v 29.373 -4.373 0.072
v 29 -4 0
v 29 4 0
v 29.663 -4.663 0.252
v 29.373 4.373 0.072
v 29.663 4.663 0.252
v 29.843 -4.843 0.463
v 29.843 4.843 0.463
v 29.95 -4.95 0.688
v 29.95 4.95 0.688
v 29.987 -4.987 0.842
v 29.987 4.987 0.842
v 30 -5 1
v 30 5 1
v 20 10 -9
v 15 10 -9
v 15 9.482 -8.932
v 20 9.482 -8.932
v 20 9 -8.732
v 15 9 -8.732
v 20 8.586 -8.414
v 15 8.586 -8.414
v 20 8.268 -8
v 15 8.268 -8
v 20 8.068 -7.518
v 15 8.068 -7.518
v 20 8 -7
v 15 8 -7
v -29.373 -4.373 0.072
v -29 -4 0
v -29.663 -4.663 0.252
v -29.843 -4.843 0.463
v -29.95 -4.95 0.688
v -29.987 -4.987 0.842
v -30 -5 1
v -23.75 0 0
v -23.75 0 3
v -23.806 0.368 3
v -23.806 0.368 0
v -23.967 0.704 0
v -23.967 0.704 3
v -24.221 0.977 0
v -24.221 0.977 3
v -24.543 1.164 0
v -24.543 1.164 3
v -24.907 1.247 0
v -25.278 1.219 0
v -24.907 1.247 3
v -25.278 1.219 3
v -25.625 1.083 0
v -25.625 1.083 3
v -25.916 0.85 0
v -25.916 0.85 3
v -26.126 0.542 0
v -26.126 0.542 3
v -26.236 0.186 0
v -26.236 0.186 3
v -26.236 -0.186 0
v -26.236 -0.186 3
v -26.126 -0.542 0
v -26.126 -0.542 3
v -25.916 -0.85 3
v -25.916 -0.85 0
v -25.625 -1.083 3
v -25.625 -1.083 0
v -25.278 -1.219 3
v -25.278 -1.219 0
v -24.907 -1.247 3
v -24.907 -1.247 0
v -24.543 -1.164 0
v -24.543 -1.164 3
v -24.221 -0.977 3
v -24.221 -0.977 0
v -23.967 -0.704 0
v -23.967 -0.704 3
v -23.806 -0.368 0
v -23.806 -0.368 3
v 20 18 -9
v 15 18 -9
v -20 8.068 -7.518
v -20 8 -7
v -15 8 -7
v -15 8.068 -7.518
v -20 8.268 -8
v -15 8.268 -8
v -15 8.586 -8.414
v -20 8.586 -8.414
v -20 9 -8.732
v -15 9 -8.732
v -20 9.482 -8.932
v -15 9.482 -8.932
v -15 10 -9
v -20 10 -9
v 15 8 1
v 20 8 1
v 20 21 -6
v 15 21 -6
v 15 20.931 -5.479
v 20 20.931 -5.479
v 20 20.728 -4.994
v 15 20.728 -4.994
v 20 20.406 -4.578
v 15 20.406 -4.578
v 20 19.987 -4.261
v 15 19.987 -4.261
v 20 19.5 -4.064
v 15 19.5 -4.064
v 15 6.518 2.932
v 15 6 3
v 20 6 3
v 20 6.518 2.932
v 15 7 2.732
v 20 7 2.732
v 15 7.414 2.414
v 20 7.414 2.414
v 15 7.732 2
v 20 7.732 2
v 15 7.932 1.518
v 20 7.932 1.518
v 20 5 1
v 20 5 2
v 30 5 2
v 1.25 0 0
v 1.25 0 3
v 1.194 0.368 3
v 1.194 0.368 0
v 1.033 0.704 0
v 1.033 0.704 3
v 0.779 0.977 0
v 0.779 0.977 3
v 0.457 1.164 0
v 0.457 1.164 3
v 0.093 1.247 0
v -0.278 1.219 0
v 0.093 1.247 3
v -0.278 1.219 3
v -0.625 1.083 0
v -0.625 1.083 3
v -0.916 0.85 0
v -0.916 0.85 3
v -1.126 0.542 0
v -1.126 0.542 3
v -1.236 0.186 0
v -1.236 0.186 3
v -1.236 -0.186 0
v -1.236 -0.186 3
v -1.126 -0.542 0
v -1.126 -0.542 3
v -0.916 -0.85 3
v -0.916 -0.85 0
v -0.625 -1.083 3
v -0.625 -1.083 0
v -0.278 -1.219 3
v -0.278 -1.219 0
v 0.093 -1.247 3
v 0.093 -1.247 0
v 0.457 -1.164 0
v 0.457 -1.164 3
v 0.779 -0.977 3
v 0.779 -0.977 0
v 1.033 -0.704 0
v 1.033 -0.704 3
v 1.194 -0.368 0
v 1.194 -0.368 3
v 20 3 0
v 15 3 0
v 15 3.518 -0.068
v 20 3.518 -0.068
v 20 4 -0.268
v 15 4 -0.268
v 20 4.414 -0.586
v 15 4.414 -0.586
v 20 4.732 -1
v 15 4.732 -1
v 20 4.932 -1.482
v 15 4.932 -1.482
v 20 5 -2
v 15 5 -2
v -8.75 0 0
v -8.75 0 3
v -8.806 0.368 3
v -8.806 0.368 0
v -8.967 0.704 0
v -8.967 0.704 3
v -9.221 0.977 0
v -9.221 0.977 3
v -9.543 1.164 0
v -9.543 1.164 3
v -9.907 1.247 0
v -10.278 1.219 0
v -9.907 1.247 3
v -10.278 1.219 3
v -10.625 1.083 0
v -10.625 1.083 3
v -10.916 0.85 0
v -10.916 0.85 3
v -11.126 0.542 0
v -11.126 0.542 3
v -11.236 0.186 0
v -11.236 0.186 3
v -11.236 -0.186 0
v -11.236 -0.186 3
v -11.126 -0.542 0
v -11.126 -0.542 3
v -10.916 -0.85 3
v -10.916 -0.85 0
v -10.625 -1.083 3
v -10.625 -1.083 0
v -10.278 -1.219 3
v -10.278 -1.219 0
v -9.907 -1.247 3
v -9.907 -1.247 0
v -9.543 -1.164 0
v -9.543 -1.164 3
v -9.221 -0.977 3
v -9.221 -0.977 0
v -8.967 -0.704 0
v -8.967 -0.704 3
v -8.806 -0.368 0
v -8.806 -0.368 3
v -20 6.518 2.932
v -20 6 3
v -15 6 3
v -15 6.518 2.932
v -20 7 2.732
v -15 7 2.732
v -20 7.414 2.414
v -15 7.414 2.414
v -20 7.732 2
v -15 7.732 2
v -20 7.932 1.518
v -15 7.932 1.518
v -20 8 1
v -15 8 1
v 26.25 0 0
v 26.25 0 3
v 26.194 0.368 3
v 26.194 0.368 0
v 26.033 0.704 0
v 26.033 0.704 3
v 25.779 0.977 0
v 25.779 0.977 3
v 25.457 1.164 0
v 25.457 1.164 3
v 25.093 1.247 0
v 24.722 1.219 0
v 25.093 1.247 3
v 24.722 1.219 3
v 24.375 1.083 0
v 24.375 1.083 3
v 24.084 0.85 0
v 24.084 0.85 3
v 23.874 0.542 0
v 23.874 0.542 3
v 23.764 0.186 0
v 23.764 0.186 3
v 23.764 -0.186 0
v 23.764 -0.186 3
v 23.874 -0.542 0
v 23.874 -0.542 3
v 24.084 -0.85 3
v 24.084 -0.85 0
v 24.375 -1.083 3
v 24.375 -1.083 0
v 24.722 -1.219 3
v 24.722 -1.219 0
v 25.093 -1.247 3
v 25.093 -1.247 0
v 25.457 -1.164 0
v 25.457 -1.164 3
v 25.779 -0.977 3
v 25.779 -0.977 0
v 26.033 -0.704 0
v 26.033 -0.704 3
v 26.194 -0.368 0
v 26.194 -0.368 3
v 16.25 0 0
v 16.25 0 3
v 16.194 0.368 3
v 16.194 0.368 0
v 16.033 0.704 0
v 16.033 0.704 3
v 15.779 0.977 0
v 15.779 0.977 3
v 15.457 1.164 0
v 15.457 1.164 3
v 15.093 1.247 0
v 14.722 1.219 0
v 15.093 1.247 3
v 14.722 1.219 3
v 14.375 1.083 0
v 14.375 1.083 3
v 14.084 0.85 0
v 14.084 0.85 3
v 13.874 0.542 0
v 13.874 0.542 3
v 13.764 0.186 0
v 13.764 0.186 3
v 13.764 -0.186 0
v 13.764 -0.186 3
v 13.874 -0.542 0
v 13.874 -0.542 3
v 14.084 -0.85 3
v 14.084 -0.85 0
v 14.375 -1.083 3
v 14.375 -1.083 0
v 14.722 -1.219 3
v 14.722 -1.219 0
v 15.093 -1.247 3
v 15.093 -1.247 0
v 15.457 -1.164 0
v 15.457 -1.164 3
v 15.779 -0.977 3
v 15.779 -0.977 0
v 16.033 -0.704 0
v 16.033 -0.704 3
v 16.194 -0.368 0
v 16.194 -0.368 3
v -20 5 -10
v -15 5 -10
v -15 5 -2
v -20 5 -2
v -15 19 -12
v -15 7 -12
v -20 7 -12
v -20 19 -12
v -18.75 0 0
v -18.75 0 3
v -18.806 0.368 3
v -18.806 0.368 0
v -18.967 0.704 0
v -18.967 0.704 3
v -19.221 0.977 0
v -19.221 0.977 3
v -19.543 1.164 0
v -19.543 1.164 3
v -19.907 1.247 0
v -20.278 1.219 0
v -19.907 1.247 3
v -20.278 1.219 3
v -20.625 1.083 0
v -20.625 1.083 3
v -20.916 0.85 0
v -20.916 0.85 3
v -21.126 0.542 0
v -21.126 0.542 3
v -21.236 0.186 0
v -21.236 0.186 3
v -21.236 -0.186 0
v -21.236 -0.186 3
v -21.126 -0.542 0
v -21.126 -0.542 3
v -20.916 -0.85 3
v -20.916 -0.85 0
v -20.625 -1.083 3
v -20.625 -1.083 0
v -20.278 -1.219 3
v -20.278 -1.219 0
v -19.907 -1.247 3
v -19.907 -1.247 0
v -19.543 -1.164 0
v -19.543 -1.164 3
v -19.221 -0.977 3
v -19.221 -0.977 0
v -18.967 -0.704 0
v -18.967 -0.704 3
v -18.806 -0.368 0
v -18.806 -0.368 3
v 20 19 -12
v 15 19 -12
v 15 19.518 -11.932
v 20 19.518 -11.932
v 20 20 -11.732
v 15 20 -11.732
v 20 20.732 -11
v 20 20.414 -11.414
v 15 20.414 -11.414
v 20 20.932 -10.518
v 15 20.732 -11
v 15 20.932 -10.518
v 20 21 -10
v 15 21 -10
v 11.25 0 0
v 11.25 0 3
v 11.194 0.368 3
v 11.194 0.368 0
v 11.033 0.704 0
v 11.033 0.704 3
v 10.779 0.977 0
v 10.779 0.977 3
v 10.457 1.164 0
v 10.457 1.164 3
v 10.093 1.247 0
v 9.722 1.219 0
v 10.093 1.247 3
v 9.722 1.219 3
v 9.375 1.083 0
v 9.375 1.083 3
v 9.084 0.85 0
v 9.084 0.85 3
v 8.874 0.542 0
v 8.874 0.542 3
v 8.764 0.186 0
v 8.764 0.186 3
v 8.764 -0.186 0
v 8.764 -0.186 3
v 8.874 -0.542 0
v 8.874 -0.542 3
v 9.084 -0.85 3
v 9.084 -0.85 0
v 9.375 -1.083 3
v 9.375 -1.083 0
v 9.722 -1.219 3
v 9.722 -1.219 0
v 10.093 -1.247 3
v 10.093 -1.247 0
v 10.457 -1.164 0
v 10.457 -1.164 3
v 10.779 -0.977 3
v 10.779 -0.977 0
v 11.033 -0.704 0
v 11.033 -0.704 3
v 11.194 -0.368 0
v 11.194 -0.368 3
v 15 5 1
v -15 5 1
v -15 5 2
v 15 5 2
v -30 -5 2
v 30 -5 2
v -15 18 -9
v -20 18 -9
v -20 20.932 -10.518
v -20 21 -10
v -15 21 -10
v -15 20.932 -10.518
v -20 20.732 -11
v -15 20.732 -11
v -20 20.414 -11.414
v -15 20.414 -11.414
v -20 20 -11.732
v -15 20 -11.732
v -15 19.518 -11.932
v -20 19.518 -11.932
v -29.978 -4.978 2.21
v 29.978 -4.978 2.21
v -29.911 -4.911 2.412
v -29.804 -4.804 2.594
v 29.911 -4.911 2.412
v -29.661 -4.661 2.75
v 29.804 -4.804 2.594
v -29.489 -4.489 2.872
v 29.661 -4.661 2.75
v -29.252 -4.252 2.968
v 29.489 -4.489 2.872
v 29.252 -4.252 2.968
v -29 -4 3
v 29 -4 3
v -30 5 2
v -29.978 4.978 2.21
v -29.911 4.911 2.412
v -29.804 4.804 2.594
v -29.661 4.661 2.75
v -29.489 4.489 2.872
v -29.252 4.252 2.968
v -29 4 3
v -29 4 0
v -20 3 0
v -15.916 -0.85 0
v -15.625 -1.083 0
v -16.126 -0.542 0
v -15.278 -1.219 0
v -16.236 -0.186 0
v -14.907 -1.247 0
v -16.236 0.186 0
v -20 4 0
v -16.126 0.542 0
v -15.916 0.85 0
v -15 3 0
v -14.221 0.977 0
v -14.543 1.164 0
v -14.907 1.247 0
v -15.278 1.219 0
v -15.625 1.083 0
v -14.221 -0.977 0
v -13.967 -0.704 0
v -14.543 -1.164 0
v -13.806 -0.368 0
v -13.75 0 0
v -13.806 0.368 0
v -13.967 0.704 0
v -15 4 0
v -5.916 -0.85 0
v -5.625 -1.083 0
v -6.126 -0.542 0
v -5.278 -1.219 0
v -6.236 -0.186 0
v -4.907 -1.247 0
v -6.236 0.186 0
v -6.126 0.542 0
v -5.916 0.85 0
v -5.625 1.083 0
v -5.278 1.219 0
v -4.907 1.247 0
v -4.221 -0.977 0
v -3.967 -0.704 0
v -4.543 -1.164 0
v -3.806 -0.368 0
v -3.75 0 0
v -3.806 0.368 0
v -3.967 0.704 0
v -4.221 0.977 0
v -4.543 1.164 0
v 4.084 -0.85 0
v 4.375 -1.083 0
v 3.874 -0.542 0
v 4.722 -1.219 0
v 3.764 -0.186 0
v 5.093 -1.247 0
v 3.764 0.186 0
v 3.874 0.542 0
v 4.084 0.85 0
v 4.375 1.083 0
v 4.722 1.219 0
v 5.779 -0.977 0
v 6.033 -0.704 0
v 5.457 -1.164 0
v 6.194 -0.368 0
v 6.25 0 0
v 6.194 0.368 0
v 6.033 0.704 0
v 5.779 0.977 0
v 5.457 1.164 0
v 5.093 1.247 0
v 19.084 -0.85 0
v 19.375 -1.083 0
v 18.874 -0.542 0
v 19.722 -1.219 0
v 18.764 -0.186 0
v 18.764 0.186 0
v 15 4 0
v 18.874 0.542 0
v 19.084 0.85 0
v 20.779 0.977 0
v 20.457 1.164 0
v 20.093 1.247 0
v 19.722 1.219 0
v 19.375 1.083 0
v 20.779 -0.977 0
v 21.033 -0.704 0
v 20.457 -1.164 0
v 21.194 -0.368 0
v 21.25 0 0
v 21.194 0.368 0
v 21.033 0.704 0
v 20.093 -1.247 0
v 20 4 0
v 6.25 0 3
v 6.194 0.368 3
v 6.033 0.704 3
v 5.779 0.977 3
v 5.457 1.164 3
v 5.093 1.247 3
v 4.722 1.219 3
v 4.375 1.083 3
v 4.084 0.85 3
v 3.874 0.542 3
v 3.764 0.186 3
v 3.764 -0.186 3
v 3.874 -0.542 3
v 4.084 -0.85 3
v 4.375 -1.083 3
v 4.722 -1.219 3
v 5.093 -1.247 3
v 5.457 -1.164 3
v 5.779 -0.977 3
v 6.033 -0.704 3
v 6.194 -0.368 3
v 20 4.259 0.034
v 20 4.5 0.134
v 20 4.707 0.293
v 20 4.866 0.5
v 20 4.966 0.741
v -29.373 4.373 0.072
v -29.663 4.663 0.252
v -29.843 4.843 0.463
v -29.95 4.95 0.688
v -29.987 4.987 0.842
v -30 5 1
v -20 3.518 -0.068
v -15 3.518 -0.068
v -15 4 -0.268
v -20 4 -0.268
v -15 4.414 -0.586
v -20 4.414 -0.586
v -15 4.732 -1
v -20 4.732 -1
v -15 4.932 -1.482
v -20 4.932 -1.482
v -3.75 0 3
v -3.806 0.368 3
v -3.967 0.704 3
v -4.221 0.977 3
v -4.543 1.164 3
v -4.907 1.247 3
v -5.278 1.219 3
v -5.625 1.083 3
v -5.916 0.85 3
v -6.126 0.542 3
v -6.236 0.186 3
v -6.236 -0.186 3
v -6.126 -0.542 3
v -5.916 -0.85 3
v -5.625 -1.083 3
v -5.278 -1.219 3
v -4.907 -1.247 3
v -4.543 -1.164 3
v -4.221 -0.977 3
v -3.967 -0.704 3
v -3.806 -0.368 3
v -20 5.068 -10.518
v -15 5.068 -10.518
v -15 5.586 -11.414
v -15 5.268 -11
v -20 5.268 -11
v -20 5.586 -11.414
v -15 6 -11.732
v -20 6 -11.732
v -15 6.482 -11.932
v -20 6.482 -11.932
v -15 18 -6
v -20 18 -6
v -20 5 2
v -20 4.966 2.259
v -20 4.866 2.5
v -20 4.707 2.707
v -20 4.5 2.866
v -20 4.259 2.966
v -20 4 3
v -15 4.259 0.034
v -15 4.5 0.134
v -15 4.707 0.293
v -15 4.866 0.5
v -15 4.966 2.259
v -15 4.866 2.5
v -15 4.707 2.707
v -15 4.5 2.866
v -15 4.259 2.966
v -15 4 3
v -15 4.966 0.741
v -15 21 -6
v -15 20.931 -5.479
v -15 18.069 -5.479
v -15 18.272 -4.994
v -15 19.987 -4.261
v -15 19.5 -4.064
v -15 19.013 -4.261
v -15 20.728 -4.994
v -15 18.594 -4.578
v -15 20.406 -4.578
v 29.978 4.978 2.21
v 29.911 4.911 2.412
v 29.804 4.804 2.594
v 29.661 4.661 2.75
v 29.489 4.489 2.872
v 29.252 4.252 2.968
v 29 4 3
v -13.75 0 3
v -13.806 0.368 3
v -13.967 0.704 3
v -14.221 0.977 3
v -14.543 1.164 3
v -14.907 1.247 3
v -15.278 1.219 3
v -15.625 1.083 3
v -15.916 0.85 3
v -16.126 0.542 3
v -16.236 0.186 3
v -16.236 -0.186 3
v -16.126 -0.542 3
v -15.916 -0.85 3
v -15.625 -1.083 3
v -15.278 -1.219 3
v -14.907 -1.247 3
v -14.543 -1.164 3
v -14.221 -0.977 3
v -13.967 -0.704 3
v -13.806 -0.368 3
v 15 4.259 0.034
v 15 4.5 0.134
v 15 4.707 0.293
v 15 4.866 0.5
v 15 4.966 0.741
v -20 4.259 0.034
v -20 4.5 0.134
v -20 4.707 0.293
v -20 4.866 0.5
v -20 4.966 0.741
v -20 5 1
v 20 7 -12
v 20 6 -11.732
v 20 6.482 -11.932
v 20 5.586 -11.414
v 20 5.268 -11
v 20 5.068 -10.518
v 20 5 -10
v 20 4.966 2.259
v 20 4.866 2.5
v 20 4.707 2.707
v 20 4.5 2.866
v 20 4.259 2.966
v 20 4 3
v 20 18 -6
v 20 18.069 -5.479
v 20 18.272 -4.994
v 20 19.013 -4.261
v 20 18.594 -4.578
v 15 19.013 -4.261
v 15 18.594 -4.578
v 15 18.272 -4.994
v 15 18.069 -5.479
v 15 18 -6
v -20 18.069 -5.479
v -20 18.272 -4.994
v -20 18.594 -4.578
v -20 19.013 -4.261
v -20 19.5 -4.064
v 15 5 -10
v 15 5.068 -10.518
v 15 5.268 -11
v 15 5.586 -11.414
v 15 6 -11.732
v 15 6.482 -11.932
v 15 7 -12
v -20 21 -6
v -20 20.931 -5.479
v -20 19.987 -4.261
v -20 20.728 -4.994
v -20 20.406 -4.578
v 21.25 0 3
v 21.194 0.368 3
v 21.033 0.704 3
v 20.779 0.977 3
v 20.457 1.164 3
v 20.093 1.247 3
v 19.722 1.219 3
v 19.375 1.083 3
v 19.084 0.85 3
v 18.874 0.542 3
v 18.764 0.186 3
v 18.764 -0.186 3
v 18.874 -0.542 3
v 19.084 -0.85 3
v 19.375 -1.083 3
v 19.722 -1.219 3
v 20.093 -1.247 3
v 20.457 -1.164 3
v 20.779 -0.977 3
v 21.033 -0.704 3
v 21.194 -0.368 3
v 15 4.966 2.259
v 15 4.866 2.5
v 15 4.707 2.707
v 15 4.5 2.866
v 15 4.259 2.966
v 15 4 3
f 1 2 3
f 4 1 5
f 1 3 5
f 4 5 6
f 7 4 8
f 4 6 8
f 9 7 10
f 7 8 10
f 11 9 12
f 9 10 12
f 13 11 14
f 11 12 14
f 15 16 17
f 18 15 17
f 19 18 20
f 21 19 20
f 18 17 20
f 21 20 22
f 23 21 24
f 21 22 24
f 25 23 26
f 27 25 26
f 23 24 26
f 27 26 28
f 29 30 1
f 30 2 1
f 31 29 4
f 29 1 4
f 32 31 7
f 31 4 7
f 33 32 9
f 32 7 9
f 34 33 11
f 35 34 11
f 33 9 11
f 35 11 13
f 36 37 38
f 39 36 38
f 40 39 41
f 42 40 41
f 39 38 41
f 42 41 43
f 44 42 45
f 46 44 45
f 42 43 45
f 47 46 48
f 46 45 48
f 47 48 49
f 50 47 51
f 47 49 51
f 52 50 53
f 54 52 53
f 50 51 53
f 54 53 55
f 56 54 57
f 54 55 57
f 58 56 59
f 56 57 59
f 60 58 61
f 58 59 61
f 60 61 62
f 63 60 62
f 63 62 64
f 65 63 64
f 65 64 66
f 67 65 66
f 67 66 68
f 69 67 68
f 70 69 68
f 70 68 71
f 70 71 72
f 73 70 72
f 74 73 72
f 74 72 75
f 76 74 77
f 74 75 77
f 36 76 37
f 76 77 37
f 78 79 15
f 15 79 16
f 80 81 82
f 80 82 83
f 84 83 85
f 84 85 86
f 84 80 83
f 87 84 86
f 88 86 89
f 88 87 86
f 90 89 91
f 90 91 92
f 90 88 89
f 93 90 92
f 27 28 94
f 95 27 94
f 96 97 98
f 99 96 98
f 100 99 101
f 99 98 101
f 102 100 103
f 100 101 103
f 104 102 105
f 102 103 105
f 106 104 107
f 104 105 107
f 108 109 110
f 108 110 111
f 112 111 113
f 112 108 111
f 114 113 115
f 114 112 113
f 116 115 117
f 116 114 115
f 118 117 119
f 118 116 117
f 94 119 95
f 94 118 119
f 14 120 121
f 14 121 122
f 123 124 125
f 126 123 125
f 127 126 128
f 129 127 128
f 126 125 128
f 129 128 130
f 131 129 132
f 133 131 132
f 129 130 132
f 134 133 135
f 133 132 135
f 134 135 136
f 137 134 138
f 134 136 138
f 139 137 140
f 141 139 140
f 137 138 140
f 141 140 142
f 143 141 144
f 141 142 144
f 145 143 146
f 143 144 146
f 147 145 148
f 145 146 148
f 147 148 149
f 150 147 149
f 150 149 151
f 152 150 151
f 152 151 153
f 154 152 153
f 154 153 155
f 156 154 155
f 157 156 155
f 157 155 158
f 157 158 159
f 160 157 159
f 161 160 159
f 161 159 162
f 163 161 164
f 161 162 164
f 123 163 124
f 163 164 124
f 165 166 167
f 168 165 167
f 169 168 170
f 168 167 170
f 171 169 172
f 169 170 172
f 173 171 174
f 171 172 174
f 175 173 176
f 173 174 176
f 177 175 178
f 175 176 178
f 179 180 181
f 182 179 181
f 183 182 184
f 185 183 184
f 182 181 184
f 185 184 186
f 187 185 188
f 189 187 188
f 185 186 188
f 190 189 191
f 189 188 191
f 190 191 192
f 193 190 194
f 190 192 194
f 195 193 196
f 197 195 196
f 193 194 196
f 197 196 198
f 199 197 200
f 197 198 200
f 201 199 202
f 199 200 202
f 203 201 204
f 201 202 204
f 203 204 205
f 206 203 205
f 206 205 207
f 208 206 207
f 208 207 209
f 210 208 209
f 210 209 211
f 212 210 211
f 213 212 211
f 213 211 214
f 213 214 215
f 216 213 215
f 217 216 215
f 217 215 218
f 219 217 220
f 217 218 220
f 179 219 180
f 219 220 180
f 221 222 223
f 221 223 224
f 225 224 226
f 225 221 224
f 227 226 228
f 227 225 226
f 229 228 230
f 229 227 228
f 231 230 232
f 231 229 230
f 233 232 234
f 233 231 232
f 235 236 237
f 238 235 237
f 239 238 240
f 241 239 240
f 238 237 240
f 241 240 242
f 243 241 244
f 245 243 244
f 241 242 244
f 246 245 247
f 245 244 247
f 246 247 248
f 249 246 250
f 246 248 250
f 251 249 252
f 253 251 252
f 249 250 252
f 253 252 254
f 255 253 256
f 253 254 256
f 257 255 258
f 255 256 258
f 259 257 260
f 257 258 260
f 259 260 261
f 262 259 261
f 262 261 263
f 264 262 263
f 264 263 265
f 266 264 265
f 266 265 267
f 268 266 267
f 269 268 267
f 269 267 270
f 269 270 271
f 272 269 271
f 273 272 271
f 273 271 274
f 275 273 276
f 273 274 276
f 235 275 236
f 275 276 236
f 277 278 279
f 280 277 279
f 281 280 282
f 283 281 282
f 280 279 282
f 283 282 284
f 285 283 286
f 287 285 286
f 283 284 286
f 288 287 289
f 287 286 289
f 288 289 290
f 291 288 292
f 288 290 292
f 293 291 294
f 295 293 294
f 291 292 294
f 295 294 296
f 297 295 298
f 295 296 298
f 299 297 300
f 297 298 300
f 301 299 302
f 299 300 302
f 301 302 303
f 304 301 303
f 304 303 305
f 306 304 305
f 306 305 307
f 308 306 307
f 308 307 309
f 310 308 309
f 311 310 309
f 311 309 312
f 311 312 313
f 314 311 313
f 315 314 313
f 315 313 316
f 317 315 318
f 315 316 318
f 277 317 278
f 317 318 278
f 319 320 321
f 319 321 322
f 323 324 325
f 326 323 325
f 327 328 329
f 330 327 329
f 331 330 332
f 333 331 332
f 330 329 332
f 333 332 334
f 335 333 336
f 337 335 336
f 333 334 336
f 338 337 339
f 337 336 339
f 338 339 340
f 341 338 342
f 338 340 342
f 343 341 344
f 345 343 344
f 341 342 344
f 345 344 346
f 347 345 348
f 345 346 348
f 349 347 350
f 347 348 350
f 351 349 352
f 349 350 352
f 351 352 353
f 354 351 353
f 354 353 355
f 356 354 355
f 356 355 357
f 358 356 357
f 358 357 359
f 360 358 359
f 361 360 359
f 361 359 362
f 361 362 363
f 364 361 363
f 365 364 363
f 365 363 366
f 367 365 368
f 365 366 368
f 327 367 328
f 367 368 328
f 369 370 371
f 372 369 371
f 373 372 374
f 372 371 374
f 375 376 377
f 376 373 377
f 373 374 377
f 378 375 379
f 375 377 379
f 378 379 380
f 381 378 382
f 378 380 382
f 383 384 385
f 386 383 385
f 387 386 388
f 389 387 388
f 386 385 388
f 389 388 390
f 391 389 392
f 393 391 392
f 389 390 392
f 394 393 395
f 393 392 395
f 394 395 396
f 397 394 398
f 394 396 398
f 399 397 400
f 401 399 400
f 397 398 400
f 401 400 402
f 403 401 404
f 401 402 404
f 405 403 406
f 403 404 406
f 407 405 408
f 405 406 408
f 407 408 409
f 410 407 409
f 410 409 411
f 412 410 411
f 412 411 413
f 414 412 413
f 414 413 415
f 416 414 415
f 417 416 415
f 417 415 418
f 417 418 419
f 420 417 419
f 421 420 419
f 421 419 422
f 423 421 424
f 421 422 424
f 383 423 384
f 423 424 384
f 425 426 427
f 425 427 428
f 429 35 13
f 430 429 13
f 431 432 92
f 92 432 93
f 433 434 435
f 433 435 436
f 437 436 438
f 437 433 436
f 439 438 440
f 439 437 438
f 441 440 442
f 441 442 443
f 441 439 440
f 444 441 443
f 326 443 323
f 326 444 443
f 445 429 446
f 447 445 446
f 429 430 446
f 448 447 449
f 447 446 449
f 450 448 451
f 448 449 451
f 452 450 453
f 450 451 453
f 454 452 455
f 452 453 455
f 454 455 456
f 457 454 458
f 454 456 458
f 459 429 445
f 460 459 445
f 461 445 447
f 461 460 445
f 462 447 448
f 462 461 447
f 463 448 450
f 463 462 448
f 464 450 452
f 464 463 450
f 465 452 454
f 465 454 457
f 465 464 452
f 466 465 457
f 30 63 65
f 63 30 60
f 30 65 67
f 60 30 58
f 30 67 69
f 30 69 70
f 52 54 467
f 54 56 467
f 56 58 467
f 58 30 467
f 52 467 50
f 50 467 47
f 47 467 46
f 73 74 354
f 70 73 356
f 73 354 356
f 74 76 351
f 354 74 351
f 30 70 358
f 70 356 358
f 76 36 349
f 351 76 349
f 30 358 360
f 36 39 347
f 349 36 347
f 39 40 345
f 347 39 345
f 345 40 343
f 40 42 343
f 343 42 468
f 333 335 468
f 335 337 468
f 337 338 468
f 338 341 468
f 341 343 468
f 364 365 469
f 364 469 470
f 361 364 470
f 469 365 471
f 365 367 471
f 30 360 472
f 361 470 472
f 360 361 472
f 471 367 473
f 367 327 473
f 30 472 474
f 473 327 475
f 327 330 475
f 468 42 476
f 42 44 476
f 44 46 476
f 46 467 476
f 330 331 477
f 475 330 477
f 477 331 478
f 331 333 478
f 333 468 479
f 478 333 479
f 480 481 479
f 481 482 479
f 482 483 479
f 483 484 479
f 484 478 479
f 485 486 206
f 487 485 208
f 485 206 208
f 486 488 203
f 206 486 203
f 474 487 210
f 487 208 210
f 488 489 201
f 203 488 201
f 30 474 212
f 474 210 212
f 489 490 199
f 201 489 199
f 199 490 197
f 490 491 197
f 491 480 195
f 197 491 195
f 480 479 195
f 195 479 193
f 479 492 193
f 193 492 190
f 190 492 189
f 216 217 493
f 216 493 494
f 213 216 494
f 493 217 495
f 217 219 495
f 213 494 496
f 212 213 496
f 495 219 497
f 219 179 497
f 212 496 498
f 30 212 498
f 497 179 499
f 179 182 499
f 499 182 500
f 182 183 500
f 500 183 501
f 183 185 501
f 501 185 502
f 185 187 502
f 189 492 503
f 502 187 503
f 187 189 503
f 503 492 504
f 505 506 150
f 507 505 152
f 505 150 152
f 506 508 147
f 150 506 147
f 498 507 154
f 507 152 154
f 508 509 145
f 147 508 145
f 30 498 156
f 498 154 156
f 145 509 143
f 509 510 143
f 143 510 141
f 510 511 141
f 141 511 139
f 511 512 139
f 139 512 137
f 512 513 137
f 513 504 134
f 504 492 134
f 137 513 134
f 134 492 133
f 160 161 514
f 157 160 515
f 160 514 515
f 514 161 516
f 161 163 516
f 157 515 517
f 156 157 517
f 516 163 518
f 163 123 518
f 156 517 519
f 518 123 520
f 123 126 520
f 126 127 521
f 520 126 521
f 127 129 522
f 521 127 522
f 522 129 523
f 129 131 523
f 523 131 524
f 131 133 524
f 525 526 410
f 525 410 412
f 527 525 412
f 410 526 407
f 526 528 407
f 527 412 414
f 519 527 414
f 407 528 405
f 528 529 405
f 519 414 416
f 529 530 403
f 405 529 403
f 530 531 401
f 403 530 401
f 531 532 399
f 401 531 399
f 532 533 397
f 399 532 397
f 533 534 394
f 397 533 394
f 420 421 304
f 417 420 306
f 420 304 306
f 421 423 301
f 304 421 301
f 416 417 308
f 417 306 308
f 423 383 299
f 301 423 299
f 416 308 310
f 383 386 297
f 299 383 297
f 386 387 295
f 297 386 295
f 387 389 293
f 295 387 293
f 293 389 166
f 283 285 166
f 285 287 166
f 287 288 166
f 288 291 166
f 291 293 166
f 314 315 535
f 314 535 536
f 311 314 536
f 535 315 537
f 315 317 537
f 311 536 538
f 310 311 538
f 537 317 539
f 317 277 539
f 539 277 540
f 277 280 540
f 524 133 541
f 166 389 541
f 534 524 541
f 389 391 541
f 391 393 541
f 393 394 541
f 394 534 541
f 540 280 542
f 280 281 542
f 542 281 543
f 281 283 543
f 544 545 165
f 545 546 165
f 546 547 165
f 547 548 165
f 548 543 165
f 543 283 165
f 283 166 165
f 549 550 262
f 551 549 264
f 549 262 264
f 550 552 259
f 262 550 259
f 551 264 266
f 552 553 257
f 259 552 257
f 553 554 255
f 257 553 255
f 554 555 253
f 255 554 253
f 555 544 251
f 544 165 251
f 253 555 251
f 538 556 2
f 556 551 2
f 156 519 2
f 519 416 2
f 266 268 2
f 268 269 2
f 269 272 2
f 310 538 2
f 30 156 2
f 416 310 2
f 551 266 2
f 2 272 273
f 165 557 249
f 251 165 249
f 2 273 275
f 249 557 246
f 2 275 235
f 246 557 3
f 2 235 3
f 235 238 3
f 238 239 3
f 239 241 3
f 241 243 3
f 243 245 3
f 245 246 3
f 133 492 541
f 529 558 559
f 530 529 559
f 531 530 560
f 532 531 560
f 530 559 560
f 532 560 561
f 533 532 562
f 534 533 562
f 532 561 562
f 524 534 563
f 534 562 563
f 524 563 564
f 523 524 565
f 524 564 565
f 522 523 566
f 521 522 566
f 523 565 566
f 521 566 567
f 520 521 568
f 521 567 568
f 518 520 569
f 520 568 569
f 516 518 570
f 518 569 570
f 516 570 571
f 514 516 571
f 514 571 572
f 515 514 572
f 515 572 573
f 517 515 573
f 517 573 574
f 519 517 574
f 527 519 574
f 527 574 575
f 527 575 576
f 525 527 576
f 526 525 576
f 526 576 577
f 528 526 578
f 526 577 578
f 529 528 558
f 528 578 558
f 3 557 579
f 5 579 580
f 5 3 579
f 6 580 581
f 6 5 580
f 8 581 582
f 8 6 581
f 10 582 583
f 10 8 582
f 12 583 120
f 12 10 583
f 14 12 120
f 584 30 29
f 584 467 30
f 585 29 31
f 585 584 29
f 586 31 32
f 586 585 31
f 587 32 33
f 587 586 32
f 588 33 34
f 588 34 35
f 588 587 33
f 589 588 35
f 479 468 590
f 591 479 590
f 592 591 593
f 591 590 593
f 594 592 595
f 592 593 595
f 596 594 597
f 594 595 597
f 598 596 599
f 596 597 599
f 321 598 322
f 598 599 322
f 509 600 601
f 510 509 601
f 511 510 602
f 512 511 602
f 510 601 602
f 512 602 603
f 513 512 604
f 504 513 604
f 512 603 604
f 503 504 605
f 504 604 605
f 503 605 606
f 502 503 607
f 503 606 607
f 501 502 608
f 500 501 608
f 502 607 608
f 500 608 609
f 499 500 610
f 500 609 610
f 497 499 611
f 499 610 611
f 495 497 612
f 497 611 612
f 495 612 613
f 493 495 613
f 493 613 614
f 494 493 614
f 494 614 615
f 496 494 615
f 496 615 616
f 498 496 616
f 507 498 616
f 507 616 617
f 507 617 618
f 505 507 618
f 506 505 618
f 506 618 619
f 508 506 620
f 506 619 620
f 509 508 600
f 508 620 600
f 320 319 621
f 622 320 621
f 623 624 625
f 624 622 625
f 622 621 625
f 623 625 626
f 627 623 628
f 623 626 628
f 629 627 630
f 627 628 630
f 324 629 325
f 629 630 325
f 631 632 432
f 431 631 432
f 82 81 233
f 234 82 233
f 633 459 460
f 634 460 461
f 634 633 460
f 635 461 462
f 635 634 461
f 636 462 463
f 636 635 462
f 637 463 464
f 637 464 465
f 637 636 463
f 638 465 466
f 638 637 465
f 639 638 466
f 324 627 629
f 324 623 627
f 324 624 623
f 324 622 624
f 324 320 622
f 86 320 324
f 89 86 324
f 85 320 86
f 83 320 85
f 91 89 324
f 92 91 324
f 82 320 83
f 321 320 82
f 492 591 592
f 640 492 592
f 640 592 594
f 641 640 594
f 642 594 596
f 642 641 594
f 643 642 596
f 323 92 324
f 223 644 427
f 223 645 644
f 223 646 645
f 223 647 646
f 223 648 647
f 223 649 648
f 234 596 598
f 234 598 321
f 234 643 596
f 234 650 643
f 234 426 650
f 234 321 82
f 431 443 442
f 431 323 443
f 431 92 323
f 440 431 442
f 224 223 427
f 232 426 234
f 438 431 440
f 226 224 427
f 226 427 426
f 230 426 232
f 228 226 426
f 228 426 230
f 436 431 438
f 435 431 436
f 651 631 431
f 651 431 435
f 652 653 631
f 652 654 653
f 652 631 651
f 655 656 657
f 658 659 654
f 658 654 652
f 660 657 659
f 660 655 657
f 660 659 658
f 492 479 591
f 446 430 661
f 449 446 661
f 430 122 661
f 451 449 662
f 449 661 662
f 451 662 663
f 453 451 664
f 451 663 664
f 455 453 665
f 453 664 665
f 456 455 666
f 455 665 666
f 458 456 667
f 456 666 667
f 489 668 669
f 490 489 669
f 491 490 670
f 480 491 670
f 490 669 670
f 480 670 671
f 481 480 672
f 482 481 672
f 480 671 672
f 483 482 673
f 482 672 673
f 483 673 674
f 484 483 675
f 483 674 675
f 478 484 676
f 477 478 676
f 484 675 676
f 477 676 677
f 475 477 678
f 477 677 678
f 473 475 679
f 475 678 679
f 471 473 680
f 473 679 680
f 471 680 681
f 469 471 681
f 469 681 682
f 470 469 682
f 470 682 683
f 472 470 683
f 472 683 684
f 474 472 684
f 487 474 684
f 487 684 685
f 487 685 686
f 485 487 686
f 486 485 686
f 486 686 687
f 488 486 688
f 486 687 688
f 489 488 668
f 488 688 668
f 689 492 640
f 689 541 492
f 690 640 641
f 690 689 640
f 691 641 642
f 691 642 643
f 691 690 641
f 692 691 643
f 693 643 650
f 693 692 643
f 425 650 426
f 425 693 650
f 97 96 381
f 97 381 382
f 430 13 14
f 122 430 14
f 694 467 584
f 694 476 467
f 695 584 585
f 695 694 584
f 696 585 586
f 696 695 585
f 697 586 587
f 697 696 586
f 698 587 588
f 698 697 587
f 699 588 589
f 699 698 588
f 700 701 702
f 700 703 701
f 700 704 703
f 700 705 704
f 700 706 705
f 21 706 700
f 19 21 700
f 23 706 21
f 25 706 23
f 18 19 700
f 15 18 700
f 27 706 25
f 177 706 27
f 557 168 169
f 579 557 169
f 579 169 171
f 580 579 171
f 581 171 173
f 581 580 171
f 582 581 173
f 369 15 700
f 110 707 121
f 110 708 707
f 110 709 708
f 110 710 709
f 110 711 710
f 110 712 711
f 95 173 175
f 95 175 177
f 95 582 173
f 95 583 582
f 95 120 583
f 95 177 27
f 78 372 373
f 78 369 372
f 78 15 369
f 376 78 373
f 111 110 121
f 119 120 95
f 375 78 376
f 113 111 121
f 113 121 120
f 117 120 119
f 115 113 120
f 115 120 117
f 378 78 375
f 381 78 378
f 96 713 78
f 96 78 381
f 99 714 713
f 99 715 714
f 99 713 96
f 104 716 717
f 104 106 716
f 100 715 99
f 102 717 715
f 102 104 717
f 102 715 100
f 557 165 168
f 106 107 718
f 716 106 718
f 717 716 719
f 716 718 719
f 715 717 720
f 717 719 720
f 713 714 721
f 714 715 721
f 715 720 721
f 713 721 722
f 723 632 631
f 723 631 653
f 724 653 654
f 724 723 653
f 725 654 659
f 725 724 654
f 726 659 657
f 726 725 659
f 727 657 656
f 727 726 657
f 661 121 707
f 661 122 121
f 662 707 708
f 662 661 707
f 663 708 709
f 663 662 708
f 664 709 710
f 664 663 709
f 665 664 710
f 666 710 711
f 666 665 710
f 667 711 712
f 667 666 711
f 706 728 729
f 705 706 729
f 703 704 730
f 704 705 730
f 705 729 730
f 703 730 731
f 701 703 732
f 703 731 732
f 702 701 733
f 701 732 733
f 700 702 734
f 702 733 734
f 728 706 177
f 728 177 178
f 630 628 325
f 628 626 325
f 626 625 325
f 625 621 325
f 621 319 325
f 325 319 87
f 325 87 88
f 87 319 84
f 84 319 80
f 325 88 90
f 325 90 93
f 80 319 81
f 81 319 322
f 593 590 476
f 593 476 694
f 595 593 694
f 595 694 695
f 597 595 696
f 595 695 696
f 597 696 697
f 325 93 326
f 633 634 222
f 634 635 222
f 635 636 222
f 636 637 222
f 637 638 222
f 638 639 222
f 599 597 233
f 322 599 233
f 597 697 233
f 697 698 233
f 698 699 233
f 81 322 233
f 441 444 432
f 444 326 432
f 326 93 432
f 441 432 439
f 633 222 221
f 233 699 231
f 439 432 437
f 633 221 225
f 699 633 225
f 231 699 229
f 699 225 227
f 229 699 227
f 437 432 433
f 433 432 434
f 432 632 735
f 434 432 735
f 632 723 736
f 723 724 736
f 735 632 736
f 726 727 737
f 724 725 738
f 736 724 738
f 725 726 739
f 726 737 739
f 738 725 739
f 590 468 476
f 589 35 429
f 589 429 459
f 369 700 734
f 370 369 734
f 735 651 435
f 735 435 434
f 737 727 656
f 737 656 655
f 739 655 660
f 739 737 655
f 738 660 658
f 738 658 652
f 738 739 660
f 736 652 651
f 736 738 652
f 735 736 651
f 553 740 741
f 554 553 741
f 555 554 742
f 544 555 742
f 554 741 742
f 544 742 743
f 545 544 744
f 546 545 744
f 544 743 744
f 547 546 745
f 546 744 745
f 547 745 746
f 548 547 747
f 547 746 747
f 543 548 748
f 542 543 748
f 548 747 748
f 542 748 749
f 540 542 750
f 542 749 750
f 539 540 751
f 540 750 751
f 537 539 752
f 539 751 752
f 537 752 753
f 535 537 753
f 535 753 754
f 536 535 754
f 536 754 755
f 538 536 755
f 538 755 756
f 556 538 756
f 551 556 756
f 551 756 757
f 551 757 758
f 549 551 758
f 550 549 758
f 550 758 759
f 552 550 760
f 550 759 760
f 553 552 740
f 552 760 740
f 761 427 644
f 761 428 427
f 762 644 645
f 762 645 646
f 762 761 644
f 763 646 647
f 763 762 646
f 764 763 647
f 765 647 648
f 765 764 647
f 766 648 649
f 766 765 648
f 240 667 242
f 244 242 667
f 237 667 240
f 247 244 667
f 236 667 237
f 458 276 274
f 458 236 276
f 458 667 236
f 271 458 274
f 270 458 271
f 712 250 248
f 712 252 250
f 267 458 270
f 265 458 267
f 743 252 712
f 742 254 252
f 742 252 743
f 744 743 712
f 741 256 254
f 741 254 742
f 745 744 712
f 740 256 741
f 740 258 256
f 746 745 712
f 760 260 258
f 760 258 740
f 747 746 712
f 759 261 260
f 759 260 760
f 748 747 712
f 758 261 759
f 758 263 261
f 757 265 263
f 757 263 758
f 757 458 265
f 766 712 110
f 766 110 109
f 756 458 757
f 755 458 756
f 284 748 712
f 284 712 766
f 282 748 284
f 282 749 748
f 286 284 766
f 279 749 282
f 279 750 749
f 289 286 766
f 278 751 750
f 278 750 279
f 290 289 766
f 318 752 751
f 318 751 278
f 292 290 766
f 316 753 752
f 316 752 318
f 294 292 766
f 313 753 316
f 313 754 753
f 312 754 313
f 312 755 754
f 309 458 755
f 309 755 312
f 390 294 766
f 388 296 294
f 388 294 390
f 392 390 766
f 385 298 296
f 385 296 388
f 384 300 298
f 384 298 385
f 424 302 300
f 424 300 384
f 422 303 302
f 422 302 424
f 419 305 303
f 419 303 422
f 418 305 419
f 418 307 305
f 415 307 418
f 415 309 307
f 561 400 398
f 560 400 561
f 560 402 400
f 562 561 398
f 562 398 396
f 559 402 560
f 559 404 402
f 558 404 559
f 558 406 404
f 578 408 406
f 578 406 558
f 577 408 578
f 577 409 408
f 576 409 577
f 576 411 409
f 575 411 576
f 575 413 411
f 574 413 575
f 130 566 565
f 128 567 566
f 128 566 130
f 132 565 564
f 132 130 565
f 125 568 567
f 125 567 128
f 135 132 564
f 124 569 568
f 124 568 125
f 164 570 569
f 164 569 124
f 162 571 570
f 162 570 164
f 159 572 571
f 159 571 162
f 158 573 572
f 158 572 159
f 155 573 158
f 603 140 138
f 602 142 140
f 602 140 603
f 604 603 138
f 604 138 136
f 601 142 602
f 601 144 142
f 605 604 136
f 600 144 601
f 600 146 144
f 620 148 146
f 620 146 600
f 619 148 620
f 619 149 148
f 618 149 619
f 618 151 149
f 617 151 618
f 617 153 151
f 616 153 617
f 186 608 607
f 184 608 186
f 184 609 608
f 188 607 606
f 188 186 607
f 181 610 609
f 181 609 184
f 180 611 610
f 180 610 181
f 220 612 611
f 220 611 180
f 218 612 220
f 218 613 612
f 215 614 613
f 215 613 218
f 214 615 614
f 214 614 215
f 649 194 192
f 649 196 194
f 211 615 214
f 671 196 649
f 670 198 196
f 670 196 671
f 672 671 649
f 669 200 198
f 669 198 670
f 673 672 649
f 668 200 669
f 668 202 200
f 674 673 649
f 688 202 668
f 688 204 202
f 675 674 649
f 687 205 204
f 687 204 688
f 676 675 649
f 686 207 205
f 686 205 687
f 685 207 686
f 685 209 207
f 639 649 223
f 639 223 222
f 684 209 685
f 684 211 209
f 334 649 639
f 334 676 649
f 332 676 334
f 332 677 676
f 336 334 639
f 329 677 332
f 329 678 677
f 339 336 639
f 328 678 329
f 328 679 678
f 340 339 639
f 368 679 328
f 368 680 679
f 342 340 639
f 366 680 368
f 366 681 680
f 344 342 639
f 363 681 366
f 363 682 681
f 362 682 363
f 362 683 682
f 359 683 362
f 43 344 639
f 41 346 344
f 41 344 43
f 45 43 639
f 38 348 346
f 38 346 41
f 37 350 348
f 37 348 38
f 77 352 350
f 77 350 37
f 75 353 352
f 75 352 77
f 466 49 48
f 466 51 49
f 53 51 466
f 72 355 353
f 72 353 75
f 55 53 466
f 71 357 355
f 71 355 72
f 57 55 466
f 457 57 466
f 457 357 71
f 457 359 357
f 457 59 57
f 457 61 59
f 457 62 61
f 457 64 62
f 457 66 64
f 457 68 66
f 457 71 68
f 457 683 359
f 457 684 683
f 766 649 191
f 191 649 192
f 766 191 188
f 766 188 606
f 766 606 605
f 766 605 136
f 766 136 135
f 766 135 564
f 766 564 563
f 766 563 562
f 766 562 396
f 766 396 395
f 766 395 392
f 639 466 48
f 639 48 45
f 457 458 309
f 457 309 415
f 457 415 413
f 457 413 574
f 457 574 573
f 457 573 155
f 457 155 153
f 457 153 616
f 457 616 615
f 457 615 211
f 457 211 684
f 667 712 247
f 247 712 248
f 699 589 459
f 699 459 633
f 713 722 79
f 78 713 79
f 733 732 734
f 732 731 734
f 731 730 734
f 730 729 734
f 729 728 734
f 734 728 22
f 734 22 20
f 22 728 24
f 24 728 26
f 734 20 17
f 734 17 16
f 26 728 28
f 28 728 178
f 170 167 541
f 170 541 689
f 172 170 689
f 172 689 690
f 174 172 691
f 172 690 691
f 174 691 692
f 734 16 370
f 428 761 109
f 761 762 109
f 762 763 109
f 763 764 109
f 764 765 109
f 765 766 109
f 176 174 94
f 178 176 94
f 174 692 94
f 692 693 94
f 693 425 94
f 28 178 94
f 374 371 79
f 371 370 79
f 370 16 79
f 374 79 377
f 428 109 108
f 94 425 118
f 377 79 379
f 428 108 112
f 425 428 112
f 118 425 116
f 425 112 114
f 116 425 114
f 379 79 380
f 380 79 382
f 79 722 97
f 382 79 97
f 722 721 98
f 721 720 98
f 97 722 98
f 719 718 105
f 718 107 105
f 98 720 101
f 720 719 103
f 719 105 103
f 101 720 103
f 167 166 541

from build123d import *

# Parameters (mm, degrees)
F0_W        = 60
F0_H        = 10
F1_DEPTH    = 3
F2_R        = 1.25
F3_DEPTH    = 3
F4_W        = 5
F4_H        = 15
F5_DEPTH    = 16
F7_DEPTH    = 60
F8_T1_DEPTH = 5
F8_T3_DEPTH = 5
F8_T5_DEPTH = 15
F8_T7_DEPTH = 15
F9_R        = 1


# Not quite as in the source:
# - a fillet or chamfer that OpenCascade refuses, or shapes differently, is made with other operations: its cross-section is extruded or revolved along the edge and cut away or added


with BuildPart() as f1:
    # F0 (on Top) → F1 (new body)
    with BuildSketch(Plane.XY):
        Rectangle(F0_W, F0_H)
    extrude(amount=F1_DEPTH)

    # F2 (on face) → F3 (cut)
    with BuildSketch(Plane.XY.offset(3)):
        with Locations((-25, 0)):
            Circle(F2_R)
        with Locations((-20, 0)):
            Circle(F2_R)
        with Locations((-15, 0)):
            Circle(F2_R)
        with Locations((-10, 0)):
            Circle(F2_R)
        with Locations((-5, 0)):
            Circle(F2_R)
        Circle(F2_R)
        with Locations((5, 0)):
            Circle(F2_R)
        with Locations((10, 0)):
            Circle(F2_R)
        with Locations((15, 0)):
            Circle(F2_R)
        with Locations((20, 0)):
            Circle(F2_R)
        with Locations((25, 0)):
            Circle(F2_R)
    extrude(amount=-F3_DEPTH, mode=Mode.SUBTRACT)

    # F4 (on face) → F5 (join)
    with BuildSketch(Plane(origin=(0, 5, 0), x_dir=(-1, 0, 0), z_dir=(0, 1, 0))):
        with Locations((17.5, -4.5)):
            Rectangle(F4_W, F4_H)
        with Locations((-17.5, -4.5)):
            Rectangle(F4_W, F4_H)
    extrude(amount=F5_DEPTH)

    # F6 (on face) → F7 (cut)
    with BuildSketch(Plane(origin=(-20, 0, 0), x_dir=(0, -1, 0), z_dir=(-1, 0, 0))):
        Polygon((-8, -9), (-8, 3), (-21, 3), (-21, -4), (-18, -4), (-18, -9), align=None)
    extrude(amount=-F7_DEPTH, mode=Mode.SUBTRACT)

    # F8: fillet of radius 2 on 17 edges, made by hand

    # F8_s2 → F8_t1 (join)
    with BuildSketch(Plane.YZ.offset(15)):
        with BuildLine():
            ThreePointArc((3, 0), (4.4142135624, -0.5857864376), (5, -2))
            Line((5, -2), (5, 0))
            Line((5, 0), (3, 0))
        make_face()
        with BuildLine():
            ThreePointArc((10, -9), (8.5857864376, -8.4142135624), (8, -7))
            Line((8, -7), (8, -9))
            Line((8, -9), (10, -9))
        make_face()
    extrude(amount=F8_T1_DEPTH)

    # F8_s4 → F8_t3 (join)
    with BuildSketch(Plane.YZ.offset(-20)):
        with BuildLine():
            ThreePointArc((3, 0), (4.4142135624, -0.5857864376), (5, -2))
            Line((5, -2), (5, 0))
            Line((5, 0), (3, 0))
        make_face()
        with BuildLine():
            ThreePointArc((8, -7), (8.5857864376, -8.4142135624), (10, -9))
            Line((10, -9), (8, -9))
            Line((8, -9), (8, -7))
        make_face()
    extrude(amount=F8_T3_DEPTH)

    # F8_s6 → F8_t5 (cut)
    with BuildSketch(Plane.YZ.offset(-25)):
        with BuildLine():
            ThreePointArc((5, -10), (5.5857864376, -11.4142135624), (7, -12))
            Line((7, -12), (5, -12))
            Line((5, -12), (5, -10))
        make_face()
        with BuildLine():
            ThreePointArc((21, -10), (20.4142135624, -11.4142135624), (19, -12))
            Line((19, -12), (21, -12))
            Line((21, -12), (21, -10))
        make_face()
        with BuildLine():
            ThreePointArc((19, -4), (20.4142135624, -4.5857864376), (21, -6))
            Line((21, -6), (21, -4))
            Line((21, -4), (19, -4))
        make_face()
        with BuildLine():
            ThreePointArc((18, -6), (18.5857864376, -4.5857864376), (20, -4))
            Line((20, -4), (18, -4))
            Line((18, -4), (18, -6))
        make_face()
        with BuildLine():
            ThreePointArc((6, 3), (7.4142135624, 2.4142135624), (8, 1))
            Line((8, 1), (8, 3))
            Line((8, 3), (6, 3))
        make_face()
    extrude(amount=F8_T5_DEPTH, mode=Mode.SUBTRACT)

    # F8_s8 → F8_t7 (cut)
    with BuildSketch(Plane.YZ.offset(10)):
        with BuildLine():
            ThreePointArc((5, -10), (5.5857864376, -11.4142135624), (7, -12))
            Line((7, -12), (5, -12))
            Line((5, -12), (5, -10))
        make_face()
        with BuildLine():
            ThreePointArc((19, -12), (20.4142135624, -11.4142135624), (21, -10))
            Line((21, -10), (21, -12))
            Line((21, -12), (19, -12))
        make_face()
        with BuildLine():
            ThreePointArc((21, -6), (20.4142135624, -4.5857864376), (19, -4))
            Line((19, -4), (21, -4))
            Line((21, -4), (21, -6))
        make_face()
        with BuildLine():
            ThreePointArc((20, -4), (18.5857864376, -4.5857864376), (18, -6))
            Line((18, -6), (18, -4))
            Line((18, -4), (20, -4))
        make_face()
        with BuildLine():
            ThreePointArc((6, 3), (7.4142135624, 2.4142135624), (8, 1))
            Line((8, 1), (8, 3))
            Line((8, 3), (6, 3))
        make_face()
    extrude(amount=F8_T7_DEPTH, mode=Mode.SUBTRACT)

    # F9
    f9_edges = [f1.edges().sort_by_distance(p)[0] for p in [
        (0, -5, 3),
        (30, 0, 3),
        (25, 5, 3),
        (0, 5, 3),
        (-25, 5, 3),
        (-30, 0, 3),
        (0, -5, 0),
        (30, 0, 0),
        (25, 5, 0),
        (0, 5, 0),
        (-25, 5, 0),
        (-30, 0, 0),
    ]]
    fillet(f9_edges, radius=F9_R)


solid = f1.part
